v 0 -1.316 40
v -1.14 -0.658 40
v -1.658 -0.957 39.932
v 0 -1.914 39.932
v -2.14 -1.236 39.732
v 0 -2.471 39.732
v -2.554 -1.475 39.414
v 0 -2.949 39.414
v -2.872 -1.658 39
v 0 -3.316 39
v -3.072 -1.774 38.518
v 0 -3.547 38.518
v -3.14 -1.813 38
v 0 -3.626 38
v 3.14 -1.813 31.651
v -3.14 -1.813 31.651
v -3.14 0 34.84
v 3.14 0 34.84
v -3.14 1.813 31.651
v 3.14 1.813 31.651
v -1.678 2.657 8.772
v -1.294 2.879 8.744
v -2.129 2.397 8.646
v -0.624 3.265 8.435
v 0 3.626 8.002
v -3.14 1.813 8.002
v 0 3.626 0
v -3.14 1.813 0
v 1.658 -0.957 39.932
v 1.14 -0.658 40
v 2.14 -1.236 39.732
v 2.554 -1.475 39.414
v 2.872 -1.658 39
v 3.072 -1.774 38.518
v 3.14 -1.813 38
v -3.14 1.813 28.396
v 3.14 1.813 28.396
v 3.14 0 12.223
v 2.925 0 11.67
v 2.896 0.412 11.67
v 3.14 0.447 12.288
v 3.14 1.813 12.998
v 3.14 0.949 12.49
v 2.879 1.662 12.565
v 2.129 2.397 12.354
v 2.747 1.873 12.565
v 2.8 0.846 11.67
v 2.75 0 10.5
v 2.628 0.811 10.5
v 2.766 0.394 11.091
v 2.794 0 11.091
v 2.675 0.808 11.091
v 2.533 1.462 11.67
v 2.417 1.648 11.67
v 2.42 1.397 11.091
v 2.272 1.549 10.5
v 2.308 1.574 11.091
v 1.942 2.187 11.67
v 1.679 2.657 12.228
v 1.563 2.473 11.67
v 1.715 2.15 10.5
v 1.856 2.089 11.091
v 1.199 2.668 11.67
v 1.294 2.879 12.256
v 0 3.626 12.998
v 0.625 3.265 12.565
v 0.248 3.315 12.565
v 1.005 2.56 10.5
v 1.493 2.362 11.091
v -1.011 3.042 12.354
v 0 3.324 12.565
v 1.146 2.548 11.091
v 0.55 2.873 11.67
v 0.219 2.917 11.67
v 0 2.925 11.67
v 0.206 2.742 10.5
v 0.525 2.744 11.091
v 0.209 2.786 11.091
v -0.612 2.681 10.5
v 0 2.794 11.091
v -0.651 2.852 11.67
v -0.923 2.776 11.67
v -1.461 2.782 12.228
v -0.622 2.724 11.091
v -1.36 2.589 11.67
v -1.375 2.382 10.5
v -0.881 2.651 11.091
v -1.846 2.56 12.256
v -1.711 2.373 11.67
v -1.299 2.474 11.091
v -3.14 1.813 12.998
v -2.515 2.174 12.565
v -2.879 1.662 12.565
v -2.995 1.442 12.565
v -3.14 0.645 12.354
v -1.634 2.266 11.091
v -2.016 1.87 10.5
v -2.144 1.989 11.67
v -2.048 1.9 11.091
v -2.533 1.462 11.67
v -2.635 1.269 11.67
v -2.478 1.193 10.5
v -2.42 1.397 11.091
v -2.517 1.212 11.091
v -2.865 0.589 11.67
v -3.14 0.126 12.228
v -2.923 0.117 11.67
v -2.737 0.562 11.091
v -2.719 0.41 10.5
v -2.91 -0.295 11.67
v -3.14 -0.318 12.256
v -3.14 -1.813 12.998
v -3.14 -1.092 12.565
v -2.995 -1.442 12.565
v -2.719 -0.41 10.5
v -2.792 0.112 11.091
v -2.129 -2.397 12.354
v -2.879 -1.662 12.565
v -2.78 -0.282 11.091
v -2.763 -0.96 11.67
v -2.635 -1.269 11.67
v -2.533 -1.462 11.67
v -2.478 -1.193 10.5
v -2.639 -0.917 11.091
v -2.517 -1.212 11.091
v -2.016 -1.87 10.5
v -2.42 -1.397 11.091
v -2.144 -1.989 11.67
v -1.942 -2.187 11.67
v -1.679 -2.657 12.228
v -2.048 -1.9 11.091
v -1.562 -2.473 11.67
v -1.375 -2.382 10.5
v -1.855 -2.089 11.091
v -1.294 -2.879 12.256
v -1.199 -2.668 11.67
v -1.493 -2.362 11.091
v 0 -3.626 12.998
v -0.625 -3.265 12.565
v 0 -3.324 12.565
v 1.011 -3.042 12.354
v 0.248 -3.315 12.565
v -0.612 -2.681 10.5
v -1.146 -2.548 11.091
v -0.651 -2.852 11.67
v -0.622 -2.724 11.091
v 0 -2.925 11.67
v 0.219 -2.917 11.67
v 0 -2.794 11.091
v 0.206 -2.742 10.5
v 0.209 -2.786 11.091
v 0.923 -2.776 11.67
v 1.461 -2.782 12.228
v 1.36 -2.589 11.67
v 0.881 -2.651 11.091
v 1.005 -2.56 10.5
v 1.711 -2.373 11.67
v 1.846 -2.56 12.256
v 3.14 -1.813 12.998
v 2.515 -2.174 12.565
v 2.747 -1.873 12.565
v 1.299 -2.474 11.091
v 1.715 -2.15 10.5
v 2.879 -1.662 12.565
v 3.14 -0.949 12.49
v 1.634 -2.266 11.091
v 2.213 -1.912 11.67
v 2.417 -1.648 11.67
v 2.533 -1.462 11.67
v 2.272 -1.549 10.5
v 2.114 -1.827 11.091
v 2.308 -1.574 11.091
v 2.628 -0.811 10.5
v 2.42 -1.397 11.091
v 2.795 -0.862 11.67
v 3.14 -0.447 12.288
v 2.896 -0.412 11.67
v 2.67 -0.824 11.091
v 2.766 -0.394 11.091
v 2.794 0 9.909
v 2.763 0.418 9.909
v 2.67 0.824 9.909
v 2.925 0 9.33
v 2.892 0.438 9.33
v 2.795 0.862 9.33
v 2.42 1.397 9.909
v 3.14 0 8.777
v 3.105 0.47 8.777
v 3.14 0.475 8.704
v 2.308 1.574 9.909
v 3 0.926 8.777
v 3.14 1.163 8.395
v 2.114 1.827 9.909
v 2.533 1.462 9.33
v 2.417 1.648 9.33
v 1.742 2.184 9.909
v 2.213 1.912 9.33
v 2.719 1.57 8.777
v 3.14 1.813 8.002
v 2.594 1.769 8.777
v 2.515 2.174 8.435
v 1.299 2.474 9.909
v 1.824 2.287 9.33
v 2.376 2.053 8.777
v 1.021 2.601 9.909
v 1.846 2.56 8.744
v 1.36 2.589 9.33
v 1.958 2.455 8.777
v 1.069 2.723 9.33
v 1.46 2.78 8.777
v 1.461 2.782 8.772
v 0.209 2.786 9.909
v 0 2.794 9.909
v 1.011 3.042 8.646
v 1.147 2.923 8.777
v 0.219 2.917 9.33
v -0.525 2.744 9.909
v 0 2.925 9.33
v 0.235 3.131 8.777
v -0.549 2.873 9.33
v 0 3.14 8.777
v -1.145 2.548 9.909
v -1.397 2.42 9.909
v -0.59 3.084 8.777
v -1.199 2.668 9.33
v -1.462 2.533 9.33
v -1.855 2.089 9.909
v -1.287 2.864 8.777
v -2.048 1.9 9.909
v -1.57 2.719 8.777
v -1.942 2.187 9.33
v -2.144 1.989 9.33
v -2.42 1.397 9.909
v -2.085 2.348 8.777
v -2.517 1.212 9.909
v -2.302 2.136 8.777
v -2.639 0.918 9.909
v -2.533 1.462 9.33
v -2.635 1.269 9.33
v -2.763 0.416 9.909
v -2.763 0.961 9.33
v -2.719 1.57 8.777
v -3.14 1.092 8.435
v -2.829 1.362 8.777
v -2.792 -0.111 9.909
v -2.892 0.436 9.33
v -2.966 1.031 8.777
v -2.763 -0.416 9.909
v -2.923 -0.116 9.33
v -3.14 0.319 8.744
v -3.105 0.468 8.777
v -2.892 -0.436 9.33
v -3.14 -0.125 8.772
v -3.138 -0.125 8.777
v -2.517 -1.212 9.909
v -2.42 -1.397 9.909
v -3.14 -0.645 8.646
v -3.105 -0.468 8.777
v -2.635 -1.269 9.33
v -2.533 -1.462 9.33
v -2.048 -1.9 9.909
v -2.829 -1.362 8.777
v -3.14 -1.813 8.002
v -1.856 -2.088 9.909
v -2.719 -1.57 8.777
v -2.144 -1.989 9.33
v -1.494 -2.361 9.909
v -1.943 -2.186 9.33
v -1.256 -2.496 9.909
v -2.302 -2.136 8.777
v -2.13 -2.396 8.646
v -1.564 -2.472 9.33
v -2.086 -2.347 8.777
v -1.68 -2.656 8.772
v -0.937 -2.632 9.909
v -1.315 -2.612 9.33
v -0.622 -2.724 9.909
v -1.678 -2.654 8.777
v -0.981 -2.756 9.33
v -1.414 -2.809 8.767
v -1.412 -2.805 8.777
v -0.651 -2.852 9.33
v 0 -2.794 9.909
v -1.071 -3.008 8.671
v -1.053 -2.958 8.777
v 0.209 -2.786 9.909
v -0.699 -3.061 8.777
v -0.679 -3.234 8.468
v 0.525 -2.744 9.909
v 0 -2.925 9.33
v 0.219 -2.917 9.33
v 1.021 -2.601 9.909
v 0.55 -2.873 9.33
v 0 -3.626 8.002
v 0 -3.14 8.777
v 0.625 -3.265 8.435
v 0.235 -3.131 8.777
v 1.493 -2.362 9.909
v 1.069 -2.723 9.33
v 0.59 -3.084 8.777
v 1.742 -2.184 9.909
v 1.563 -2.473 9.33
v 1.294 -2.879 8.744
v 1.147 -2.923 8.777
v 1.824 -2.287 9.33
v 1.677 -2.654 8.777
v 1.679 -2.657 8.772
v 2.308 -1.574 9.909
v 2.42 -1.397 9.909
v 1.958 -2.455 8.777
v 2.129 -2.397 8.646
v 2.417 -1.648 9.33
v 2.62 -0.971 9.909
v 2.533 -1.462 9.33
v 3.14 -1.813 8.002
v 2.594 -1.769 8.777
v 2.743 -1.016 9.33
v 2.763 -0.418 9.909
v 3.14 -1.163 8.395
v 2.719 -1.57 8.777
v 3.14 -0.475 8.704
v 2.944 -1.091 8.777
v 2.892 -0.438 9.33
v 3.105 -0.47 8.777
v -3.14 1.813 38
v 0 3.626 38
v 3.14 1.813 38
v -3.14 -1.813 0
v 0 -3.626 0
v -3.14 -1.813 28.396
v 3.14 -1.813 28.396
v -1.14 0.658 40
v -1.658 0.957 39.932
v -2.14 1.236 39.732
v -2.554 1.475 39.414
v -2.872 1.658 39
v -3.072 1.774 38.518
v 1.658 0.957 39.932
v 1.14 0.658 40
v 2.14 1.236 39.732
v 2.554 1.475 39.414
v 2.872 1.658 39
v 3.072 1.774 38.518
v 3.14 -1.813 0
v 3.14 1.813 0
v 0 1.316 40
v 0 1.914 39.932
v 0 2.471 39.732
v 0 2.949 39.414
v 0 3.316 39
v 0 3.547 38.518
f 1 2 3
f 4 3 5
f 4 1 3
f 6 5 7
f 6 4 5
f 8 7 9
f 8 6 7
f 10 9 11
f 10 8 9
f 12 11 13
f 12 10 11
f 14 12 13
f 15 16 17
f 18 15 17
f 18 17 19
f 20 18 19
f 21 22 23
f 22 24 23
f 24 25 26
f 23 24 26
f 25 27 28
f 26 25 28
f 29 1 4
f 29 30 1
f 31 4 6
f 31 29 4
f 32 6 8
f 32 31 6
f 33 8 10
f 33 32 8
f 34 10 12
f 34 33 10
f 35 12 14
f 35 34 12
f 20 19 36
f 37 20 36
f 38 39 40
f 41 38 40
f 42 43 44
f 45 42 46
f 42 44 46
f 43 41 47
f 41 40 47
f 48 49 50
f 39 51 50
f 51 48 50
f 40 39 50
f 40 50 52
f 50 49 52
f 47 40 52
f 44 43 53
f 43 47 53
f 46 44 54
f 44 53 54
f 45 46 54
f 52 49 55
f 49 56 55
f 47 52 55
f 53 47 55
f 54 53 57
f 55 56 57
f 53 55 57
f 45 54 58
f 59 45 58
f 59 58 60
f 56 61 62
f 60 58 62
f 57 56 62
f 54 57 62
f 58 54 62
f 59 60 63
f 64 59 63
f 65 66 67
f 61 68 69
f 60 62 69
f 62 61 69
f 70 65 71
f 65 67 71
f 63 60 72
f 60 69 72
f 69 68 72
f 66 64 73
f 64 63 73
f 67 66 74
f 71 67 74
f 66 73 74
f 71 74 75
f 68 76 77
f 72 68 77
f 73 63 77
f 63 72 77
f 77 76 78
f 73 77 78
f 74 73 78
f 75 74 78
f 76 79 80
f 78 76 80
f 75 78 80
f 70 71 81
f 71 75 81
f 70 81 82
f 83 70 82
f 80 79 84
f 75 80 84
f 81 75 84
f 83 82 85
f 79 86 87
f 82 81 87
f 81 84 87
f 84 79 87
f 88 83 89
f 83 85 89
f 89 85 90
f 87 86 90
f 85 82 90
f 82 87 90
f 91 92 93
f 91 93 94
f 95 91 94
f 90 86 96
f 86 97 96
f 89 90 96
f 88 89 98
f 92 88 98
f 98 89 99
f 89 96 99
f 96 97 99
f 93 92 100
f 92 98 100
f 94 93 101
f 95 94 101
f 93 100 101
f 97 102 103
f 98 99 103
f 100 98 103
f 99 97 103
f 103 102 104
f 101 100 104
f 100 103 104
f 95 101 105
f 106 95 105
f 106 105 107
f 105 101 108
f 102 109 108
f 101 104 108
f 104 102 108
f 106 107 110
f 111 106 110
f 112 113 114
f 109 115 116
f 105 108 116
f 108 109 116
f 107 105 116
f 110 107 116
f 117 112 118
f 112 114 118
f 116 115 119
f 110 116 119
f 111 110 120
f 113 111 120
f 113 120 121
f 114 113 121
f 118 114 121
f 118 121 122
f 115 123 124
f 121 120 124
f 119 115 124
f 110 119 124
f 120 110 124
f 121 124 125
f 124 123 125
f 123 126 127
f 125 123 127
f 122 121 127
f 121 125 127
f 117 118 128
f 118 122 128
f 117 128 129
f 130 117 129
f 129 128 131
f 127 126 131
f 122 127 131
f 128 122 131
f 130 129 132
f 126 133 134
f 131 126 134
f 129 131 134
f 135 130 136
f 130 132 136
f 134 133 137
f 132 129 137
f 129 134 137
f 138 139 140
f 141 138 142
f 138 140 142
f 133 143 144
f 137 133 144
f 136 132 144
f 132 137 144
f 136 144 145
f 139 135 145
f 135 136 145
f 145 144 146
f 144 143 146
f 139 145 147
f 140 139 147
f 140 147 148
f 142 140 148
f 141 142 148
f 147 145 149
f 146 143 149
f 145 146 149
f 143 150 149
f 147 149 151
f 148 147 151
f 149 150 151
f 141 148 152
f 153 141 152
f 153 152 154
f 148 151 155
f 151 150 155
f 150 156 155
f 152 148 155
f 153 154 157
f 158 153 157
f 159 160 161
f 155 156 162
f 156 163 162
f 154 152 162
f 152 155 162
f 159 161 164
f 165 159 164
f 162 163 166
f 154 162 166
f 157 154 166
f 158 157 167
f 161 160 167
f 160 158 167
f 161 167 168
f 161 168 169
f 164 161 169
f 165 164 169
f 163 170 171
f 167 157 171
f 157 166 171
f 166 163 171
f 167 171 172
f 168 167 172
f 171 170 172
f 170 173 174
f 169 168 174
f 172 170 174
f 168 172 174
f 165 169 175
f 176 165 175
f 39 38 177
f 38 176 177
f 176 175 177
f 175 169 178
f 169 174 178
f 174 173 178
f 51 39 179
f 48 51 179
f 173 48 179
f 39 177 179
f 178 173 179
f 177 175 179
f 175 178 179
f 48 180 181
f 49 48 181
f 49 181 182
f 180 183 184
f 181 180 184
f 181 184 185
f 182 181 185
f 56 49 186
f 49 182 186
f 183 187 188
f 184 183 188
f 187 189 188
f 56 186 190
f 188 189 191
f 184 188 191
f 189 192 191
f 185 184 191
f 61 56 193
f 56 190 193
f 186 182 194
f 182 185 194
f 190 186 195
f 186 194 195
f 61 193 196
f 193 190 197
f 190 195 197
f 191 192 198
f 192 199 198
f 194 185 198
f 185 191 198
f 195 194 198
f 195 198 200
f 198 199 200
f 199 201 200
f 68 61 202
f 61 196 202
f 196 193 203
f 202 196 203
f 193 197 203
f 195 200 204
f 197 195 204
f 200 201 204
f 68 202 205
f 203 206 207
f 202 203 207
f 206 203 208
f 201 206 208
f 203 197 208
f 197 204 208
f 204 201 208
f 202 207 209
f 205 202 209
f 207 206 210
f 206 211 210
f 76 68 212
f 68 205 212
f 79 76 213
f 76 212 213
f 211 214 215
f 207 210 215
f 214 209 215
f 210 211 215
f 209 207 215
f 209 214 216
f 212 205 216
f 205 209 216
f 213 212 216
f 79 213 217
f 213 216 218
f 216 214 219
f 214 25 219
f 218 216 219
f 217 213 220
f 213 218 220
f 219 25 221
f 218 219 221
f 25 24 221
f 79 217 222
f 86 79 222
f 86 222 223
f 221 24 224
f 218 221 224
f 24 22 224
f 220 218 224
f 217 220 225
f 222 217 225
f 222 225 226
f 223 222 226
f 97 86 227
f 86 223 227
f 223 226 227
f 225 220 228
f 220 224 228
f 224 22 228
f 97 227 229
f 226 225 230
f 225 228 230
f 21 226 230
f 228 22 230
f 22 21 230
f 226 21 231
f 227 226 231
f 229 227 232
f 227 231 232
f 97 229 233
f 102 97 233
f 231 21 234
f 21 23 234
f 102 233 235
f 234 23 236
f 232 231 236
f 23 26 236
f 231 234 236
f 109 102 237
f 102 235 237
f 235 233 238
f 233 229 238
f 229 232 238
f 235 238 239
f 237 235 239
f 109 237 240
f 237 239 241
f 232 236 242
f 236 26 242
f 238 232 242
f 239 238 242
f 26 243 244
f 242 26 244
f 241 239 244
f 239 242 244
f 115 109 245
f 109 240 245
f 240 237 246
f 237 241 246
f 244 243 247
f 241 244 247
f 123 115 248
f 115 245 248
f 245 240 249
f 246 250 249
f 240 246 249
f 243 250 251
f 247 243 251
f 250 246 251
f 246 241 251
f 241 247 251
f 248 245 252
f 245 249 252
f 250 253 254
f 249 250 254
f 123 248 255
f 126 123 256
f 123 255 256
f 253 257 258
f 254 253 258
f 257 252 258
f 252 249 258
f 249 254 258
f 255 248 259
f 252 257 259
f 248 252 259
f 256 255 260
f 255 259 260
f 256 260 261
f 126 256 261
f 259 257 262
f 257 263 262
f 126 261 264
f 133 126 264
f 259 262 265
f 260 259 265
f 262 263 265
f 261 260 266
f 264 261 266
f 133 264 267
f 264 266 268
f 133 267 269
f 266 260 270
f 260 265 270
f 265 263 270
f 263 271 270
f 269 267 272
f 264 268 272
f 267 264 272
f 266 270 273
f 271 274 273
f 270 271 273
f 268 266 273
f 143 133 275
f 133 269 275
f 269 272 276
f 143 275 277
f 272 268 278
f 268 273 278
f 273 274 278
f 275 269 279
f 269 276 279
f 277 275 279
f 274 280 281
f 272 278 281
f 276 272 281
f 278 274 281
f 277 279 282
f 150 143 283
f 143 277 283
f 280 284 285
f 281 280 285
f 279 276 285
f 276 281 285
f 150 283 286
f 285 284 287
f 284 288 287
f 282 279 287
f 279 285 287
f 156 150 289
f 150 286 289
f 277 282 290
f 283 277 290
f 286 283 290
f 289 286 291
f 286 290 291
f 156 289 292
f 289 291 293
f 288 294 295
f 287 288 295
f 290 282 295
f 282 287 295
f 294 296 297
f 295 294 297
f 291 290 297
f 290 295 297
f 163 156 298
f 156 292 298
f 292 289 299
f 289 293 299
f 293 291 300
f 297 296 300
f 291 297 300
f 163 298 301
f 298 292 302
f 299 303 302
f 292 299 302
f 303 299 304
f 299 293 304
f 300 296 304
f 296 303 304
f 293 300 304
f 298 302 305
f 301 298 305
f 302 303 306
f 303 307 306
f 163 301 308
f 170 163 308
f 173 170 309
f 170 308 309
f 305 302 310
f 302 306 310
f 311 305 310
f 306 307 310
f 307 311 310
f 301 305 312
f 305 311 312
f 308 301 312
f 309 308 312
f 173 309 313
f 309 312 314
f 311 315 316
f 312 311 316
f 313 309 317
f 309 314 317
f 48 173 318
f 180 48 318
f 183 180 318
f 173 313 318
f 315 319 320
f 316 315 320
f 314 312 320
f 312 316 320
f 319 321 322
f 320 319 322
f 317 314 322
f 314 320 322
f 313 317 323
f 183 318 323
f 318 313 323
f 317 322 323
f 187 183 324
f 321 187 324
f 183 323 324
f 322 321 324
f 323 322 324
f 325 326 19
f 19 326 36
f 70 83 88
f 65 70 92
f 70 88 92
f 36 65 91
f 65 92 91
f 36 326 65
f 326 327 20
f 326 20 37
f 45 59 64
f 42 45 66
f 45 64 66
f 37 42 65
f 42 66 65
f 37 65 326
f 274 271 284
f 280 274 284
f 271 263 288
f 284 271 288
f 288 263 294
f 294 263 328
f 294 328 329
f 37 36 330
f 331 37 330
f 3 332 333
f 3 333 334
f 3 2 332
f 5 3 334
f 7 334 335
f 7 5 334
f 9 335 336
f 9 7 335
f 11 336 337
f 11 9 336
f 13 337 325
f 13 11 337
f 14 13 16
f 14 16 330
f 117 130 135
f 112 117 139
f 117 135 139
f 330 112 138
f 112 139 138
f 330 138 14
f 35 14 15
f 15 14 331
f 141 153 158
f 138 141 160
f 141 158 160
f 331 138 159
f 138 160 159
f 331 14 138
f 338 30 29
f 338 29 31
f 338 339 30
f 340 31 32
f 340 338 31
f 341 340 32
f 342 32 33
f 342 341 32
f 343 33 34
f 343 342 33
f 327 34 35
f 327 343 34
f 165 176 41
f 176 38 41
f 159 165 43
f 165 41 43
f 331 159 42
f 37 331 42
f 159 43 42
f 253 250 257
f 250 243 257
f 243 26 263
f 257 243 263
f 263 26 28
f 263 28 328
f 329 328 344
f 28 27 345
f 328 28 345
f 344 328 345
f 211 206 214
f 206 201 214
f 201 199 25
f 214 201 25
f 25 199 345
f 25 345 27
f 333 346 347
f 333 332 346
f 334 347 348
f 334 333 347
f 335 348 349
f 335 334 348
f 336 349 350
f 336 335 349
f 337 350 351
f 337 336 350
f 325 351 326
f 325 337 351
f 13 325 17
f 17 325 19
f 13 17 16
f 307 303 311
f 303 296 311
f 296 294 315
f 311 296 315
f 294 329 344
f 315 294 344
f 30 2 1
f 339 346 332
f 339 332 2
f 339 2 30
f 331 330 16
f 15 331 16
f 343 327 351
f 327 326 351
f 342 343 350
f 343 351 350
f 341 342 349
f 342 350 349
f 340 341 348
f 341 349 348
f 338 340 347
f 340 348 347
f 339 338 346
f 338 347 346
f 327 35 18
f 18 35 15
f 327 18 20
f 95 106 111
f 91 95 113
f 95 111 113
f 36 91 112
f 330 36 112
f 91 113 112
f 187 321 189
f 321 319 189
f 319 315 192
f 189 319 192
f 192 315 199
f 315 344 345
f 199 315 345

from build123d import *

# Parameters (mm, degrees)
F1_DEPTH = 40
F4_R     = 4
F6_R     = 2
F8_DEPTH = 6.281


with BuildPart() as f1:
    # F0 (on Top) → F1 (new body)
    with BuildSketch(Plane.XY):
        Polygon((0, 3.62576), (-3.14, 1.81288), (-3.14, -1.81288), (0, -3.62576), (3.14, -1.81288), (3.14, 1.81288), align=None)
    extrude(amount=F1_DEPTH)

    # F5: sweep along a path in F3
    with BuildLine(Plane.XY.offset(10.5)) as f5_path:
        CenterArc((0, 0), 6.75, 0, 360)
    # F4 (on Front) → F5 (sweep, cut)
    with BuildSketch(Plane.XZ):
        with Locations((-6.75, 10.5)):
            Circle(F4_R)
    sweep(path=f5_path.line, mode=Mode.SUBTRACT)

    # F6
    f6_edges = [f1.edges().sort_by_distance(p)[0] for p in [
        (1.57, -2.71932, 40),
        (-1.57, -2.71932, 40),
        (3.14, 0, 40),
        (-1.57, 2.71932, 40),
        (-3.14, 0, 40),
        (1.57, 2.71932, 40),
    ]]
    fillet(f6_edges, radius=F6_R)

    # F7 (on face) → F8 (cut, through all)
    with BuildSketch(Plane(origin=(-3.14, 0, 0), x_dir=(0, -1, 0), z_dir=(-1, 0, 0))):
        Polygon((1.81288, 31.650778), (0, 34.840249), (-1.81288, 31.650778), (-1.81288, 28.396215), (1.81288, 28.396215), align=None)
    extrude(amount=-F8_DEPTH, mode=Mode.SUBTRACT)


solid = f1.part
